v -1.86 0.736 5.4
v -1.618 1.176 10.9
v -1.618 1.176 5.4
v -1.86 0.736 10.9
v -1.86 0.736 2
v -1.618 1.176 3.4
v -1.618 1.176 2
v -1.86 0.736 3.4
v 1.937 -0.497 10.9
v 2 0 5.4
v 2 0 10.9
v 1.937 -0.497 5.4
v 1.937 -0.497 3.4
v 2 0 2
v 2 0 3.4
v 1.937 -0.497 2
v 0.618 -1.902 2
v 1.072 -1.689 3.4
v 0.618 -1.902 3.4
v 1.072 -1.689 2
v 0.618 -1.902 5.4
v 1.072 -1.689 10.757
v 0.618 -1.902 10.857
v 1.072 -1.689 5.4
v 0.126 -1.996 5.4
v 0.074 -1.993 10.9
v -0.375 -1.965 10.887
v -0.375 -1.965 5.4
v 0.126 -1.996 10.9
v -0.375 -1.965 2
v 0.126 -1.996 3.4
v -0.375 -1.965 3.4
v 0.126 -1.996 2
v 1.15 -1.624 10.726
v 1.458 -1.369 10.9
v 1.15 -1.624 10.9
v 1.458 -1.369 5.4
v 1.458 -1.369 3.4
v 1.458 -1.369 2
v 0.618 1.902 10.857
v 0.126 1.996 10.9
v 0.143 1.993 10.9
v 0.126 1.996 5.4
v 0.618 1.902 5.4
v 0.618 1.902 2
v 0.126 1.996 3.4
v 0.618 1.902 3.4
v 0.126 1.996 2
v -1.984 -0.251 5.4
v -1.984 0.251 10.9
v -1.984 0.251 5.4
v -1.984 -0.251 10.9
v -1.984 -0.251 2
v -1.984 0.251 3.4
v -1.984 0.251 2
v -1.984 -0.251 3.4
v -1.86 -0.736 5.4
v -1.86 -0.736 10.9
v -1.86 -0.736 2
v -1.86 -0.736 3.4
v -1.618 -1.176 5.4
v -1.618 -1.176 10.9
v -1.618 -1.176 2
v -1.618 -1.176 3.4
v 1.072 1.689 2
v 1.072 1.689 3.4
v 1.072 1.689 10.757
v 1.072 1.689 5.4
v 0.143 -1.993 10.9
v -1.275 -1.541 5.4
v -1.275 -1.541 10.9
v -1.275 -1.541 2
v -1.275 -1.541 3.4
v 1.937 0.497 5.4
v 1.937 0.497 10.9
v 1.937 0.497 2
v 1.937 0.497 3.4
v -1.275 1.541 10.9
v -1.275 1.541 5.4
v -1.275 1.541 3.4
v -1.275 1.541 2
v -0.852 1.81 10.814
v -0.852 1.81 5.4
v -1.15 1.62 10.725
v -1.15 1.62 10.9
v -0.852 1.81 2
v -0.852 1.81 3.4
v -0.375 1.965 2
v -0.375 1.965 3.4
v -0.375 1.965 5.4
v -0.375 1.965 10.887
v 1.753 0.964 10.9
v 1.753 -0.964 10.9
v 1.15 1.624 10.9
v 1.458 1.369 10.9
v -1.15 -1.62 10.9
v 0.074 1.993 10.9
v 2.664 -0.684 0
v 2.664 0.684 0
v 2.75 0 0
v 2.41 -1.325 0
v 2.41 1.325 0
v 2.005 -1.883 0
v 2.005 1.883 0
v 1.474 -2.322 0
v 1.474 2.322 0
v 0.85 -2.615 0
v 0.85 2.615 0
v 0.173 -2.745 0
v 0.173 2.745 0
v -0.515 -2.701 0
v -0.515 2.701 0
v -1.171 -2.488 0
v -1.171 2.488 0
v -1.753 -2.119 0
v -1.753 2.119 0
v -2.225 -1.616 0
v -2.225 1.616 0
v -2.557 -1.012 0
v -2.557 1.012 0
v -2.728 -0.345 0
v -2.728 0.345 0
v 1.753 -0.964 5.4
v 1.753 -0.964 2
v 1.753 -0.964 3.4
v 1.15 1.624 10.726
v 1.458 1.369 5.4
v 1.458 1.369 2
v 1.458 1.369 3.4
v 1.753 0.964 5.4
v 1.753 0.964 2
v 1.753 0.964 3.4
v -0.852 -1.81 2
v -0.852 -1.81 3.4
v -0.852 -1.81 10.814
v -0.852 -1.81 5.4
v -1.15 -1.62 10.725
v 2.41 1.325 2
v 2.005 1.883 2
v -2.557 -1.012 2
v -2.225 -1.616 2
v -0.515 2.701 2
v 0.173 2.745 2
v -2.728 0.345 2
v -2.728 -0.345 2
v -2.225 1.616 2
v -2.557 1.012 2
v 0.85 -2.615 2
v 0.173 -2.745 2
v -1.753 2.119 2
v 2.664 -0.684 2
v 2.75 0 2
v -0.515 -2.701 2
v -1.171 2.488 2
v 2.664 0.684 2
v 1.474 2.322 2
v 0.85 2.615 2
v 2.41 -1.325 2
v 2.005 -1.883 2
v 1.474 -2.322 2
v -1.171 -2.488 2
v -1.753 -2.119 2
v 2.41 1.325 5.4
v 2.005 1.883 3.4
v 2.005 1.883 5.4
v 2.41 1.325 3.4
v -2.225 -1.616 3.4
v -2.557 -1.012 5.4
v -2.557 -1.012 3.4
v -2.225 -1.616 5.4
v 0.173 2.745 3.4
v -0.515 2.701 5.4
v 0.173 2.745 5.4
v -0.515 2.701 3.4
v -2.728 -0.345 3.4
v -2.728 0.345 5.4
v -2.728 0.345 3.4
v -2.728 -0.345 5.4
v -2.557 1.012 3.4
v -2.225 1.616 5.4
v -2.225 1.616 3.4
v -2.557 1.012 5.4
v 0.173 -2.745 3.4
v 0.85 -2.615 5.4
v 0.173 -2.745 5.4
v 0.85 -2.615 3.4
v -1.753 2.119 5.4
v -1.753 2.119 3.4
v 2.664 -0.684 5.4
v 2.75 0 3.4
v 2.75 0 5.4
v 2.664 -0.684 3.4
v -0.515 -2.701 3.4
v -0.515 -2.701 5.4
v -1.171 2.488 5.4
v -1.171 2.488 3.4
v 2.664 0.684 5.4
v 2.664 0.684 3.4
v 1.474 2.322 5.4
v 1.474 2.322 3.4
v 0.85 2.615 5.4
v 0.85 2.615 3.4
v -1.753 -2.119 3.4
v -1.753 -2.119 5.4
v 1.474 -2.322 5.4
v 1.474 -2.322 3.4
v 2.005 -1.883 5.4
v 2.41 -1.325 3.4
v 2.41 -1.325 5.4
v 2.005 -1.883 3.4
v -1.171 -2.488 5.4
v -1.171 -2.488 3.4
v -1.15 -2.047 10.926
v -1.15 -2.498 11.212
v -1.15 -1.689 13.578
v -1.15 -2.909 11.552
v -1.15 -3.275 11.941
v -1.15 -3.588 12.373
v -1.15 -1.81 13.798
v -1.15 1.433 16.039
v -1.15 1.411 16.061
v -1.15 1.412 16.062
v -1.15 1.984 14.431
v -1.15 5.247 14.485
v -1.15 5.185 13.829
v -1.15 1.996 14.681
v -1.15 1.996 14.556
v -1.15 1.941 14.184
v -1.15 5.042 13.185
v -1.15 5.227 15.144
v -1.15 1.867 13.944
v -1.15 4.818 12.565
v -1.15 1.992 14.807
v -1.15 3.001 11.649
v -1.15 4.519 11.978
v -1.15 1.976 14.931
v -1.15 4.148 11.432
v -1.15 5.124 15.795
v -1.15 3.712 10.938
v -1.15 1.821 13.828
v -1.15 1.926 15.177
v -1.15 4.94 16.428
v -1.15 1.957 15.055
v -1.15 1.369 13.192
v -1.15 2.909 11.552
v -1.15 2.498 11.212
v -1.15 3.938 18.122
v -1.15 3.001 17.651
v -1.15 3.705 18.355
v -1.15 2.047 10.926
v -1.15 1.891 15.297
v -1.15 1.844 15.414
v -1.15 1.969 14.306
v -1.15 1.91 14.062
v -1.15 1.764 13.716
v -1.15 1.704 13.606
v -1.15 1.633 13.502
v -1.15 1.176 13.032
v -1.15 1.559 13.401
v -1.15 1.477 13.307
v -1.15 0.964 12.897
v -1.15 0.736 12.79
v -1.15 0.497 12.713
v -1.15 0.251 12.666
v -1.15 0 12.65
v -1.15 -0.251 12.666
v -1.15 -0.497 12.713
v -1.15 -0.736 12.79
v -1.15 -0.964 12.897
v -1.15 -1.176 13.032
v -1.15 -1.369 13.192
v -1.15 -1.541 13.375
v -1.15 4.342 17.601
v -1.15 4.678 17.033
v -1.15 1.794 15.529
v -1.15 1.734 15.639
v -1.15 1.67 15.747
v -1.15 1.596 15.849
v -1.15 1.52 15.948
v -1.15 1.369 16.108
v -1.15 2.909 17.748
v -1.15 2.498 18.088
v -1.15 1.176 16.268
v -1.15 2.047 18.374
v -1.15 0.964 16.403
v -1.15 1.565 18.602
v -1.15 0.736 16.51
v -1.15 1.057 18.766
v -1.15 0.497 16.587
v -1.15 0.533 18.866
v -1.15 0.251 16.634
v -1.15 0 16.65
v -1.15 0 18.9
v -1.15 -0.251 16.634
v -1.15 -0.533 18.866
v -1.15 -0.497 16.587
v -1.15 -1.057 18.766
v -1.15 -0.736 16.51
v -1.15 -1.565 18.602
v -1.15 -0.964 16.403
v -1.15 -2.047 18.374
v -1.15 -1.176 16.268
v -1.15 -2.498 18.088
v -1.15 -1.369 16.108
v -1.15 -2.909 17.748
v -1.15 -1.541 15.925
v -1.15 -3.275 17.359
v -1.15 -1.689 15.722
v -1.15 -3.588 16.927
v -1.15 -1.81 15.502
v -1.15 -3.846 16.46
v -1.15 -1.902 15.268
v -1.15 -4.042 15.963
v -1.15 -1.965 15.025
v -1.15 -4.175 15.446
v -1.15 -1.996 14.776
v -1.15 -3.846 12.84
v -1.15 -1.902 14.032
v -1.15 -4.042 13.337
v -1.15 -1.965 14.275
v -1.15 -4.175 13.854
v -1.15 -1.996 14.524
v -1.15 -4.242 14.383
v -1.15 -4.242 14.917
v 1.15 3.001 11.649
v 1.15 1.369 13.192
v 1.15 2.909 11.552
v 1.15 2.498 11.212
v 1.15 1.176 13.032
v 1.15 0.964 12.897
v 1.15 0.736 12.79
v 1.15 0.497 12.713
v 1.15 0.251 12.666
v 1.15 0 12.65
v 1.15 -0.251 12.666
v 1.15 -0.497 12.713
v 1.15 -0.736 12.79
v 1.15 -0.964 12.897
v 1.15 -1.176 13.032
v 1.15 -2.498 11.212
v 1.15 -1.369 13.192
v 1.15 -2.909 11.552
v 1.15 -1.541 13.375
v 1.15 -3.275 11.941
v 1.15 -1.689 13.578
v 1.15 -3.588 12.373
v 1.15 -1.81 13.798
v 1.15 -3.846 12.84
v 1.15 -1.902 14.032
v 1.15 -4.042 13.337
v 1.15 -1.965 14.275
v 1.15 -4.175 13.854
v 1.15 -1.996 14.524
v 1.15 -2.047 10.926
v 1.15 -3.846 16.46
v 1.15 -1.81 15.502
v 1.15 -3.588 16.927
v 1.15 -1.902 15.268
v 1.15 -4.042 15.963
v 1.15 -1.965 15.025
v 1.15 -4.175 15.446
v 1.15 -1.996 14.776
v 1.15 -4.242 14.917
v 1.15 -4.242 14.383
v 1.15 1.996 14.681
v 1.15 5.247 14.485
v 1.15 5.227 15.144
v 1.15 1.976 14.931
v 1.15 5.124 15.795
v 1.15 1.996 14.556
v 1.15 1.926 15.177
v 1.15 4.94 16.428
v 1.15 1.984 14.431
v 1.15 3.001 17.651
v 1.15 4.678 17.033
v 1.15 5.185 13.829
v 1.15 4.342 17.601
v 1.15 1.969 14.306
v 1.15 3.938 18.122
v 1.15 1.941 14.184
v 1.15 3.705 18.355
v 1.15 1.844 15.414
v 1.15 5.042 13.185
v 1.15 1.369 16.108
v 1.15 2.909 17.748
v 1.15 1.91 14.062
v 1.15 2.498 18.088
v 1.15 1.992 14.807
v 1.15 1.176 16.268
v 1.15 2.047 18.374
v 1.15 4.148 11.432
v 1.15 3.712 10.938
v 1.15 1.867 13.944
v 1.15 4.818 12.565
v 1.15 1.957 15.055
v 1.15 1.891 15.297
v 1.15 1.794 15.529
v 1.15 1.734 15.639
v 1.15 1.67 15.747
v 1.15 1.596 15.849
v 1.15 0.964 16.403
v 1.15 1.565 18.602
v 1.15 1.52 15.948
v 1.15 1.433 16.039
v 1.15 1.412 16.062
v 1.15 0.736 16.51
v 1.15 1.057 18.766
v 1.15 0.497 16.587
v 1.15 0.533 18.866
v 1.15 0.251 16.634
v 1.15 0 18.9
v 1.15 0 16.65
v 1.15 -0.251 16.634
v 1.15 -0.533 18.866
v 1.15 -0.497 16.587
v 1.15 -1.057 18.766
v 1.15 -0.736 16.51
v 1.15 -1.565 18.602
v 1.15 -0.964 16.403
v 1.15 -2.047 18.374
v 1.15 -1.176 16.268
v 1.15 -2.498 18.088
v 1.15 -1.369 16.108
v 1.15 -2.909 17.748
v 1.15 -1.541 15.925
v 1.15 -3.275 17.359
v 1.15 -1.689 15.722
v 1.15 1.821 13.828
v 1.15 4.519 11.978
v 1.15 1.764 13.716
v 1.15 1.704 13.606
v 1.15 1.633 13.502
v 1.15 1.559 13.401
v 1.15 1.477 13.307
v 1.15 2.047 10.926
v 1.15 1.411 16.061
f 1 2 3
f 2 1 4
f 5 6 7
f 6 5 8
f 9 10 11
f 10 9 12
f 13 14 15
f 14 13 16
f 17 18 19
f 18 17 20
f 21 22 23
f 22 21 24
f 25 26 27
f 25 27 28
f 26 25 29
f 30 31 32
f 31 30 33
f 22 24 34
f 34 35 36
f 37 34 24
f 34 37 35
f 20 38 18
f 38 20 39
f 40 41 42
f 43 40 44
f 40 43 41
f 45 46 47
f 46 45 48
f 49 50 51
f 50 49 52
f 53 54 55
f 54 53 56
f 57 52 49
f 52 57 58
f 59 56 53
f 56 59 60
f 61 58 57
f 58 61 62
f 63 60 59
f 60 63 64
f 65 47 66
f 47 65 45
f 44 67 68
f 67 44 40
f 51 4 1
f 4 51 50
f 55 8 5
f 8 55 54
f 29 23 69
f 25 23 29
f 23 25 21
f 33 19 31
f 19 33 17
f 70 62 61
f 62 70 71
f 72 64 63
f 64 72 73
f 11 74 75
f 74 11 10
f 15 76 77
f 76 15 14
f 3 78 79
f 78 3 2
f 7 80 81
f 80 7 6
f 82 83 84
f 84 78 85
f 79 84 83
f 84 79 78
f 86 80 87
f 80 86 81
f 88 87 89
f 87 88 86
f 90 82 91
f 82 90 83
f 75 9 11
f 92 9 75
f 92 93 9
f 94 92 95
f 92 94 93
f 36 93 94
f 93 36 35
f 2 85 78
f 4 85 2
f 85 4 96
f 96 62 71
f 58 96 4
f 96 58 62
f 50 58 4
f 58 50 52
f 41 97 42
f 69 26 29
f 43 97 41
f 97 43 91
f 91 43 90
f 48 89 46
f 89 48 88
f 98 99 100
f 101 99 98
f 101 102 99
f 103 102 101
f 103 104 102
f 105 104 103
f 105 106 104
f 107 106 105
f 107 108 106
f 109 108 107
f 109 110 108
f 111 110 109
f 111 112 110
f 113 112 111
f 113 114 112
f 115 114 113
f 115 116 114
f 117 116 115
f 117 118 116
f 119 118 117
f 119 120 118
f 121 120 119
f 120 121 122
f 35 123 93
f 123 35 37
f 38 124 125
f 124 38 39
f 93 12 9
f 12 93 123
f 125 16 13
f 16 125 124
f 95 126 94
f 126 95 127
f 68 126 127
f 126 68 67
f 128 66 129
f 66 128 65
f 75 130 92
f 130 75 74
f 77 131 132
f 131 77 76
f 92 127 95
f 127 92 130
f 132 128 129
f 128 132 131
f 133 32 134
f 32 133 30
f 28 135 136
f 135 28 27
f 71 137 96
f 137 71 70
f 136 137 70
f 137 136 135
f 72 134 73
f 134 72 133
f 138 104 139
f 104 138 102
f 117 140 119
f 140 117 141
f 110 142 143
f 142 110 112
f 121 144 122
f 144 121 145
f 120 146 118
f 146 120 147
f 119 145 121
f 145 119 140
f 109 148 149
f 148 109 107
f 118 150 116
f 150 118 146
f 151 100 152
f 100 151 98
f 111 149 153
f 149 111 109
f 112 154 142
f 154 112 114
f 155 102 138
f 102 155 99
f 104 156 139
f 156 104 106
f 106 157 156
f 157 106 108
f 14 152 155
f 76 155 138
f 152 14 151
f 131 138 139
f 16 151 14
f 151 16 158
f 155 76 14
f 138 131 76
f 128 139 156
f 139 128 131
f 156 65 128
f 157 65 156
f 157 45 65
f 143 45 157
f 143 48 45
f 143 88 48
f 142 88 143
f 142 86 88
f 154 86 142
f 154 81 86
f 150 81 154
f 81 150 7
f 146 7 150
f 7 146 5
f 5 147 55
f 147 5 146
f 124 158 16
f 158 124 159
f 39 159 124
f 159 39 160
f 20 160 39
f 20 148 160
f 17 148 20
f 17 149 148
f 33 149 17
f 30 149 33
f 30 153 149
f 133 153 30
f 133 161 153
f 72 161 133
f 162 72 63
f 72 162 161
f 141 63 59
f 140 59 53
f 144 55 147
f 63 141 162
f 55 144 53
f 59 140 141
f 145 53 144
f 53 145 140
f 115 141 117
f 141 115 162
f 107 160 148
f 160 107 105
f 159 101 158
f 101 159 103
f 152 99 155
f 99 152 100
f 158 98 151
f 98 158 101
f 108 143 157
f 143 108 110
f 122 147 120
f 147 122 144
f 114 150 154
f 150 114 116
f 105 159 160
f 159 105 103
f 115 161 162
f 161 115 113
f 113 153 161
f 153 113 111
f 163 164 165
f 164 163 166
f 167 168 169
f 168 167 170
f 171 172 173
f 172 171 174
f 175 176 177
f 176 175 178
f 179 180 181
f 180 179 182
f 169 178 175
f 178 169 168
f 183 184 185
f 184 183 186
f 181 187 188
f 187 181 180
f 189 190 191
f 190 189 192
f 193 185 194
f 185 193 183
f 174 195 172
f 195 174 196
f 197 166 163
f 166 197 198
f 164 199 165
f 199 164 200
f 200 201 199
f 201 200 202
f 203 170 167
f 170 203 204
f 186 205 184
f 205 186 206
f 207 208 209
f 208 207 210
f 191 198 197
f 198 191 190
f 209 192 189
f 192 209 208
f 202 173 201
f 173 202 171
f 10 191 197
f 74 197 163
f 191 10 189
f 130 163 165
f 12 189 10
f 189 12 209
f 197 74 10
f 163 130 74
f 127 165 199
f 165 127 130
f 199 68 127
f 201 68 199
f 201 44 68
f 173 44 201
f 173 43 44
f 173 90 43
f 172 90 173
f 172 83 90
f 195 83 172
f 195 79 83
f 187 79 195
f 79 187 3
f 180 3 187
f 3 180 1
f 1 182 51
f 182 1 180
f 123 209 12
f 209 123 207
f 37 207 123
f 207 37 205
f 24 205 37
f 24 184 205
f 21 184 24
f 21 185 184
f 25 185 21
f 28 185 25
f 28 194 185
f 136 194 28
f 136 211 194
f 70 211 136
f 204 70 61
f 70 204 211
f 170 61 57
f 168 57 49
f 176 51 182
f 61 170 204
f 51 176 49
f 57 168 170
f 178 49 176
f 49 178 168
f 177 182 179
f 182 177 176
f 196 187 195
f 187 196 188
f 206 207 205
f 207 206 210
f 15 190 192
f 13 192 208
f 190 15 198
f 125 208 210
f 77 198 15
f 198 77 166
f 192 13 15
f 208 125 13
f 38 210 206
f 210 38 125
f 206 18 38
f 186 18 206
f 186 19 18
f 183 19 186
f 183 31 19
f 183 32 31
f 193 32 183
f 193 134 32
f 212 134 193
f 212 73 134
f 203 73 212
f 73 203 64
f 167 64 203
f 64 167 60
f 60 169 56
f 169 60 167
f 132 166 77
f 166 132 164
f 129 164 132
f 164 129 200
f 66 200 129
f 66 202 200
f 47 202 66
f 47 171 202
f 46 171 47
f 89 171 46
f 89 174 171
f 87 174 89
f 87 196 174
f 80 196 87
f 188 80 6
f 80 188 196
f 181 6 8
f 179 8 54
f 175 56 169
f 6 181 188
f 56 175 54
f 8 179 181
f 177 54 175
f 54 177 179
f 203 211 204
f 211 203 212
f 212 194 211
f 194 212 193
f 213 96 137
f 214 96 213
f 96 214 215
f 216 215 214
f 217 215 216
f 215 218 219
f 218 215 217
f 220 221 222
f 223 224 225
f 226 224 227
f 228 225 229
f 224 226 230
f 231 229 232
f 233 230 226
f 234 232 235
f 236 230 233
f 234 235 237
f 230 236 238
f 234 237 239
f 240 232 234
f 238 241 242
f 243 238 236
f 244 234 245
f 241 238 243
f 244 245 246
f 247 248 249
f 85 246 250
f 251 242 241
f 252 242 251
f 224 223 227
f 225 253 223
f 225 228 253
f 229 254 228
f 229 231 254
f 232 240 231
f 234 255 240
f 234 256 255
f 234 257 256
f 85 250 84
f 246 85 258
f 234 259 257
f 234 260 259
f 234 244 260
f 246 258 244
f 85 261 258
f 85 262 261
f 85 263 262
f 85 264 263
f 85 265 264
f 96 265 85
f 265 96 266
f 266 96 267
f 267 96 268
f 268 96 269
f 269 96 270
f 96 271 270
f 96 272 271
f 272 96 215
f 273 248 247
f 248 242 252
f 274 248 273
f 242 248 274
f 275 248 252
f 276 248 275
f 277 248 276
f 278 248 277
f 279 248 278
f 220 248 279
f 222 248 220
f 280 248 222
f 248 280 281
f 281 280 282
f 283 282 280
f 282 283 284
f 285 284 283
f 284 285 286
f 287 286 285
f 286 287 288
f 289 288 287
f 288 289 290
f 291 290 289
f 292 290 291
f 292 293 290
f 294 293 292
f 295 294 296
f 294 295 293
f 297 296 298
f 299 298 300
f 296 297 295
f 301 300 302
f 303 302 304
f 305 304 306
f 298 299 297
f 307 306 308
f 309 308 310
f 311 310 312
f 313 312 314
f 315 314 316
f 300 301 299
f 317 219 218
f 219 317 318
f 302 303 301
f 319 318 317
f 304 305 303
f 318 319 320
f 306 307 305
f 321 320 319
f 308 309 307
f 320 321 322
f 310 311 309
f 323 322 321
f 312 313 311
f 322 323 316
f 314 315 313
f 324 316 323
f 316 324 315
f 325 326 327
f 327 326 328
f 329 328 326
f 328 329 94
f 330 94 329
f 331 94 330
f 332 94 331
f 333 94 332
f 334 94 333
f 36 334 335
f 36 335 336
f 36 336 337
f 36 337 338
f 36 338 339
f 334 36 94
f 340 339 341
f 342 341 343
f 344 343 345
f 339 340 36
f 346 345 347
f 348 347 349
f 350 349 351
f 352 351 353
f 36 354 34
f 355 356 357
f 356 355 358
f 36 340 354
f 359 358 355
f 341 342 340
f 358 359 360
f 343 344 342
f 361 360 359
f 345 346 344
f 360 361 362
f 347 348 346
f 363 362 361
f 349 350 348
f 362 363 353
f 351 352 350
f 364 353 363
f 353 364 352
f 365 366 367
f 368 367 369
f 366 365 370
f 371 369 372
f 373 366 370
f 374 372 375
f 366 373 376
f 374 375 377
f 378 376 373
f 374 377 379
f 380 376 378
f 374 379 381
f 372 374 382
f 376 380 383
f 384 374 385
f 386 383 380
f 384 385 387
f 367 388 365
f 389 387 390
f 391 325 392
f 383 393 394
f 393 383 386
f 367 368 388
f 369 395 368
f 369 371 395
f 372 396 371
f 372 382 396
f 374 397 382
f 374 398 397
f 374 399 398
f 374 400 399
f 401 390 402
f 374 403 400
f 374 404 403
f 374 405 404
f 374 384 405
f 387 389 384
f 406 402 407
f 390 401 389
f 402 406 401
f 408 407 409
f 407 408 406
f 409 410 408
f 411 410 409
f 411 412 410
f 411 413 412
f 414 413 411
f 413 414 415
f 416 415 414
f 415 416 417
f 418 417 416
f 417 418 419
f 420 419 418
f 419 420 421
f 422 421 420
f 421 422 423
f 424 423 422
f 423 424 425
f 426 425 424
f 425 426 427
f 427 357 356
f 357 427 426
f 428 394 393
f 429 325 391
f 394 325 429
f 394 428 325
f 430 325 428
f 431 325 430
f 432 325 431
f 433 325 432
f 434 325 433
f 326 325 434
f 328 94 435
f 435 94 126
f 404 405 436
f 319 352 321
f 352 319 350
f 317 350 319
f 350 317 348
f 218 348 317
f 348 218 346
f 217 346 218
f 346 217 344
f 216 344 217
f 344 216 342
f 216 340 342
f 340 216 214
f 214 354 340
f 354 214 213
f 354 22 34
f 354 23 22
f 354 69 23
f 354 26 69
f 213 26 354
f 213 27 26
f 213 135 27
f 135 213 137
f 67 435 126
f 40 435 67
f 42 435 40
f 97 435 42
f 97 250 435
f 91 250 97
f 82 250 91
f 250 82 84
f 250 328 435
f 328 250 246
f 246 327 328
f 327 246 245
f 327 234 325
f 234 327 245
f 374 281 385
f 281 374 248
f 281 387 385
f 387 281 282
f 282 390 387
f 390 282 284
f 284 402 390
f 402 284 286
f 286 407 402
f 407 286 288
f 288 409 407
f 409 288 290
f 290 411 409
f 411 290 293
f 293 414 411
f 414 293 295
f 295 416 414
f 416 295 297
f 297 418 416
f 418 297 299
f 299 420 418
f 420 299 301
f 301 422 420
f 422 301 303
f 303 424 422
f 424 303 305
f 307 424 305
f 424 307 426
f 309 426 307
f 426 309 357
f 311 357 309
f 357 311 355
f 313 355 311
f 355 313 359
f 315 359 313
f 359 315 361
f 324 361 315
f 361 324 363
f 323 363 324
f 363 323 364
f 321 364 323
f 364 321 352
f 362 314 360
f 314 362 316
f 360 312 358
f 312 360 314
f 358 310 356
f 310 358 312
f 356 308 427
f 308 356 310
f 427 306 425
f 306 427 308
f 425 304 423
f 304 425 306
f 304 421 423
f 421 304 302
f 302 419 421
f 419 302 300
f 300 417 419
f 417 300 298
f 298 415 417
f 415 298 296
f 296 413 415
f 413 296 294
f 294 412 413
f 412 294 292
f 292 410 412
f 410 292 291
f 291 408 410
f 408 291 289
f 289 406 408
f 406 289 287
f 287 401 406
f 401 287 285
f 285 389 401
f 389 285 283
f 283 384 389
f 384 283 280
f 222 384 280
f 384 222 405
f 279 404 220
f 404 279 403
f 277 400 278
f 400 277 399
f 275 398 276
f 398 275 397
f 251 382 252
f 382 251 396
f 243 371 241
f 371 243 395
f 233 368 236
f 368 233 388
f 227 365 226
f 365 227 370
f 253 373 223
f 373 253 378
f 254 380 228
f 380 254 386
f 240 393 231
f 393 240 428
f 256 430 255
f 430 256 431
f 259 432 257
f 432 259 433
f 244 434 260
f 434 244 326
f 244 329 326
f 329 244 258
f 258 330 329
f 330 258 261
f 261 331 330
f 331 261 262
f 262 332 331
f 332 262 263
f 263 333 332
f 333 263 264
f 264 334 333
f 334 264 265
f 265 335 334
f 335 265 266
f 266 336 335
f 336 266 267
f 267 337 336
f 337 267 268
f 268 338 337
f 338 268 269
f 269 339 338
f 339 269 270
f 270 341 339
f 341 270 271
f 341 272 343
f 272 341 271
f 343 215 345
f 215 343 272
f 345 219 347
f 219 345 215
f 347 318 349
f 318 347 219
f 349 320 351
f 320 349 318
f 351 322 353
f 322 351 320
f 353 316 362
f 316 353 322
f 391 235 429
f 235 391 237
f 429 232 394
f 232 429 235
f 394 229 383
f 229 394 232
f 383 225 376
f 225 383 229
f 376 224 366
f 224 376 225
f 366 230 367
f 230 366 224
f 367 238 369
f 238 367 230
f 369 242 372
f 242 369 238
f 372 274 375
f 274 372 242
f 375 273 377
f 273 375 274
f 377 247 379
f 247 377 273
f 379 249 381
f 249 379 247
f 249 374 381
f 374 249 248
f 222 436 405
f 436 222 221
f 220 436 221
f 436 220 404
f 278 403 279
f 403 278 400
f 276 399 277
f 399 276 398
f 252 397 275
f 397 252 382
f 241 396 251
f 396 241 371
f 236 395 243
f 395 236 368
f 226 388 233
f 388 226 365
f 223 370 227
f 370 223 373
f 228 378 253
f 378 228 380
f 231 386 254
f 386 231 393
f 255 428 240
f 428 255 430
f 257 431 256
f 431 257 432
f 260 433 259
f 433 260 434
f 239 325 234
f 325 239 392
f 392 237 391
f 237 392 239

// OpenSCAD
cylinder_thick = 2;
cylinder_d = 5.5;
distance_between_cylinders = 1.4;

bolt_middle_length = 5.5;
bolt_d = 4;

bolt_length = 
    cylinder_thick*2
    + distance_between_cylinders
    + bolt_middle_length;

circle_in_d = 4;
circle_out_d = 8.5;

circle_thick = 2.3;

cylinder1_pos = [
    0,
    0,
    0
];

cylinder2_pos = [
    0,
    0,
    cylinder_thick + distance_between_cylinders
];

circle_diff_pos_z = circle_out_d/2
    - sqrt(
        pow(circle_out_d/2, 2)
        -pow(bolt_d/2, 2)
    );

circle_pos = [
    0,
    0,
    bolt_length - circle_diff_pos_z
];

stop_pos = [
    0,
    0,
    bolt_length - circle_diff_pos_z
];
module bolt() {
    $fn = 25;
    linear_extrude(height=bolt_length)
    circle(bolt_d/2);
};

module cylinder_() {
    $fn = 25;
    linear_extrude(height=cylinder_thick)
    circle(cylinder_d/2);
};

module circle_() {
    $fn = 50;
    rotate([
        0,
        90,
        0
    ])
    translate([
        -circle_out_d/2,
        0,
        -circle_thick/2
    ])
    linear_extrude(height=circle_thick)
    difference() {
        circle(circle_out_d/2);
        circle(circle_in_d/2);
    };
};

module stop() {
    $fn = 50;
    rotate([
        00,
        90,
        0
    ])
    translate([
        -circle_out_d/2,
        0,
        -circle_thick/2
    ])
    linear_extrude(height=circle_thick)
    rotate([
        0,
        0,
        45
    ]
    )
    intersection() {
        difference() {
            circle(circle_out_d/2+1);
            circle(circle_in_d/2);
        };
        square(circle_out_d/2+1);
    };
}

bolt();

translate(cylinder1_pos)
cylinder_();

translate(cylinder2_pos)
cylinder_();

translate(circle_pos)
circle_();

translate(stop_pos)
stop();
